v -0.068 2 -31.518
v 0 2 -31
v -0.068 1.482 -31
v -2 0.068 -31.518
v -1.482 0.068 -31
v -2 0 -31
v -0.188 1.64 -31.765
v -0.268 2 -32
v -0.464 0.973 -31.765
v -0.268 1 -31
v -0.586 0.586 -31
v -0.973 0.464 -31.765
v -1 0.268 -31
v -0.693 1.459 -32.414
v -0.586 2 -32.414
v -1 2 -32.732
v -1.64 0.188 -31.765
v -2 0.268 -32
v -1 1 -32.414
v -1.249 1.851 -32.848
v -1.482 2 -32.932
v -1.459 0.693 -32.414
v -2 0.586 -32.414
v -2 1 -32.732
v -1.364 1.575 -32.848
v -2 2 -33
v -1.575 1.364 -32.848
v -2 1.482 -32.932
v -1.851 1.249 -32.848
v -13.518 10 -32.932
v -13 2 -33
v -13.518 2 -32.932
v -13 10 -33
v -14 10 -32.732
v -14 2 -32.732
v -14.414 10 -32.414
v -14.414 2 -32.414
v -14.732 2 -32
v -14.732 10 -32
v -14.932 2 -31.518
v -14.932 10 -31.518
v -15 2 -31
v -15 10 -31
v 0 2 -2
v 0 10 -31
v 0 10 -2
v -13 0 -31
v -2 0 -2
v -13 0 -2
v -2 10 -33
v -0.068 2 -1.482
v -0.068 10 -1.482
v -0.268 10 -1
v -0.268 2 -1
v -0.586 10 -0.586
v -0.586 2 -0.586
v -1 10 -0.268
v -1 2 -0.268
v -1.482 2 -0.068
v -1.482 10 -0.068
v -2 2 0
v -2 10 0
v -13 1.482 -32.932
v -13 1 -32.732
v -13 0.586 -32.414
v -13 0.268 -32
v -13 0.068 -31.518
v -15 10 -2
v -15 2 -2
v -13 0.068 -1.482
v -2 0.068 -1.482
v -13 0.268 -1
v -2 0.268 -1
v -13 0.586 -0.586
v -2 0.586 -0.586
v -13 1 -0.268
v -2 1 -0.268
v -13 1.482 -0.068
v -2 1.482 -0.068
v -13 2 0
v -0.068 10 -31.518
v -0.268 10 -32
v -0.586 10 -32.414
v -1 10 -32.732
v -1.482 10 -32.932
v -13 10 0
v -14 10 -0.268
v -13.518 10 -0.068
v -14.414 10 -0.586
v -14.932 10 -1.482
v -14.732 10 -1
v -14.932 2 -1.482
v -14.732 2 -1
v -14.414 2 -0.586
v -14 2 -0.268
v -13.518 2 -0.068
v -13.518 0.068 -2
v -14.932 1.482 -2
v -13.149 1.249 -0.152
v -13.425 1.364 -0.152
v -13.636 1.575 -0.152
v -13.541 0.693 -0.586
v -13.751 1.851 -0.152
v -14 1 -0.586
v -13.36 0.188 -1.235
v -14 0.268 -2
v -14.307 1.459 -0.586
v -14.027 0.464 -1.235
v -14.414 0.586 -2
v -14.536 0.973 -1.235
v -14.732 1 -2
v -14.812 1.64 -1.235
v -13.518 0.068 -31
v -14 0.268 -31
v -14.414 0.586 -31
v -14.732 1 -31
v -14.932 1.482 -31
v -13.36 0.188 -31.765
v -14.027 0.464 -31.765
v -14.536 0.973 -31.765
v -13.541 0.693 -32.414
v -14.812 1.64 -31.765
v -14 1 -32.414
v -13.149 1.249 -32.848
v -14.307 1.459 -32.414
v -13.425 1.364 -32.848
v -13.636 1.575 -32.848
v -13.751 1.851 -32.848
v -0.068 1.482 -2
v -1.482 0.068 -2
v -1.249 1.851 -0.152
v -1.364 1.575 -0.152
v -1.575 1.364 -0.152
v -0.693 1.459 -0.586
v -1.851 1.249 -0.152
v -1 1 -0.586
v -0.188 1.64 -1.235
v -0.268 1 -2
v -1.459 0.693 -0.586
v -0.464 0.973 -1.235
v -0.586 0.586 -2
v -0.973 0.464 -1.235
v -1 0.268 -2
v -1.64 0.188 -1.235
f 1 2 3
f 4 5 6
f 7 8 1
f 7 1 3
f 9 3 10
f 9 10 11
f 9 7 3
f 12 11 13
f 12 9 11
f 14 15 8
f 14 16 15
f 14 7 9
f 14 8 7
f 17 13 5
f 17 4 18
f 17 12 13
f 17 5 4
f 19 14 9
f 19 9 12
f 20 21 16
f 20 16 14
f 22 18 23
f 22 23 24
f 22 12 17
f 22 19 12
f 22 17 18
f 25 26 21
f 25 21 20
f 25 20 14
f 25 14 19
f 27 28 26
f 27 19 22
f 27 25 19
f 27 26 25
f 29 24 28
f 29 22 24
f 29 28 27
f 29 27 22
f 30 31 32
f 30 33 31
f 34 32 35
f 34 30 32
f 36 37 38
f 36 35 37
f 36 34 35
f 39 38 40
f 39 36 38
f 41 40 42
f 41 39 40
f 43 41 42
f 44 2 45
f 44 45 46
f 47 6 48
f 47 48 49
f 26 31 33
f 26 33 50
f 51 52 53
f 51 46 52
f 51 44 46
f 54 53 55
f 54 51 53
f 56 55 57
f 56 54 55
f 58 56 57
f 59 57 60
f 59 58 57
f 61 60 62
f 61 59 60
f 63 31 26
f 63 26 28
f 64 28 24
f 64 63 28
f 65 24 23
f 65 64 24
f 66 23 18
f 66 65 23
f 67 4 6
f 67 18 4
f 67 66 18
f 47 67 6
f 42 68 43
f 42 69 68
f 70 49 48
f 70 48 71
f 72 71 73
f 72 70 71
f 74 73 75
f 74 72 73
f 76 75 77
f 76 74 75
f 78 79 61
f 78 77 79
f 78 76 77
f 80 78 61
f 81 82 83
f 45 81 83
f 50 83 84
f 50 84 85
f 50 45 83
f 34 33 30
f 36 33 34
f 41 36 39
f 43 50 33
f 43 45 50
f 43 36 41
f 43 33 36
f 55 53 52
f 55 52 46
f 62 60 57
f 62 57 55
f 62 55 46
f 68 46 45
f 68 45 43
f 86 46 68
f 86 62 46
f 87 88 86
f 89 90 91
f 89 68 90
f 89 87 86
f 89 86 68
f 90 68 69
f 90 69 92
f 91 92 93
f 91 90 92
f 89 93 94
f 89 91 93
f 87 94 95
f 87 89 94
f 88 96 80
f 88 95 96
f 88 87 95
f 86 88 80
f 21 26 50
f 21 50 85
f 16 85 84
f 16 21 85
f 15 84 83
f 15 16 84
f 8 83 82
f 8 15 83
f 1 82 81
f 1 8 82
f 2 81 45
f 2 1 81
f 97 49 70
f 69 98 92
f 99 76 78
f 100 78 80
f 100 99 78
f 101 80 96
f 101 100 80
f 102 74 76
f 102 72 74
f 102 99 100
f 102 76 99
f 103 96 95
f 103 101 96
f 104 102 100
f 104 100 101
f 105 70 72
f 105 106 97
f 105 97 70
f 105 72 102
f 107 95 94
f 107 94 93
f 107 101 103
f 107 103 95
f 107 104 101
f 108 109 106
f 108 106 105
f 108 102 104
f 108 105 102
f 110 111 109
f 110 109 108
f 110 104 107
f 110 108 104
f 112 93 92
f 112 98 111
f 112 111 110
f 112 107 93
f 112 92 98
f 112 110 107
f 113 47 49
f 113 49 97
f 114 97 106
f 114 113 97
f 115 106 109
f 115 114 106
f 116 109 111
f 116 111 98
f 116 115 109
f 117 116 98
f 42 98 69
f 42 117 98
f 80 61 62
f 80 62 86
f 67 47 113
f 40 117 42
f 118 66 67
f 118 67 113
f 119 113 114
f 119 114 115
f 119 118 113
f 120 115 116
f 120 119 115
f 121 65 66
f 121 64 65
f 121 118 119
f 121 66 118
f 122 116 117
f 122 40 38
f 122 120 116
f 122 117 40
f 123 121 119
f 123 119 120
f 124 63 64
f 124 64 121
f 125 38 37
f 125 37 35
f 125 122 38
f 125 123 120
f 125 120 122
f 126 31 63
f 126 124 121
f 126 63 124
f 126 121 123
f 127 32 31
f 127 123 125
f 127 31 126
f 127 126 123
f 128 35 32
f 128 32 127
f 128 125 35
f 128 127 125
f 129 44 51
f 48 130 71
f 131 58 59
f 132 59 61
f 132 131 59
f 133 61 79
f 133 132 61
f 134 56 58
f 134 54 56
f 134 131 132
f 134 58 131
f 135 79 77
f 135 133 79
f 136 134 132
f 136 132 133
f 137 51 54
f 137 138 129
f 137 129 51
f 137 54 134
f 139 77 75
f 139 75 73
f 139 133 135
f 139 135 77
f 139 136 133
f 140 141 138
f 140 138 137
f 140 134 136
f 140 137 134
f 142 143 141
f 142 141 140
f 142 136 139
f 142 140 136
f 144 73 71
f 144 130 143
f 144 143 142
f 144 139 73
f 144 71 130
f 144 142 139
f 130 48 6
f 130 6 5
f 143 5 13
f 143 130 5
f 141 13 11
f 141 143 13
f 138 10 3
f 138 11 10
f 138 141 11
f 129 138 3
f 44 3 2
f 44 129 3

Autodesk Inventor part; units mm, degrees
ref_plane "YZ Plane" through (0, 0, 0) normal (1, 0, 0) x (0, 1, 0)
ref_plane "XZ Plane" through (0, 0, 0) normal (0, 1, 0) x (-1, 0, 0)
ref_plane "XY Plane" through (0, 0, 0) normal (0, 0, 1) x (1, 0, 0)
sketch "Sketch1" plane through (0, 0, 0) normal (0, 1, 0) x (-1, 0, 0)
  line L0 (0, 0) -> (15, 0)
  line L1 (15, 0) -> (15, -33)
  line L2 (15, -33) -> (0, -33)
  line L3 (0, -33) -> (0, 0)
  dimension "d0" = 15
  dimension "d1" = 33
extrude "Extrusion1" add sketch "Sketch1" along normal blind 10
fillet "Fillet1" radius 2 2 edges at (0, 0, -16.5) (-15, 0, -16.5)
fillet "Fillet2" radius 2 10 edges at (-0.5858, 0.5858, -33) (-7.5, 0, -33) (-14.4142, 0.5858, -33) (-15, 6, -33) (0, 6, -33) (-0.5858, 0.5858, 0) (-7.5, 0, 0) (-14.4142, 0.5858, 0) (-15, 6, 0) (0, 6, 0)
sketch "Sketch2" plane through (0, 10, 0) normal (0, 1, 0) x (1, 0, 0)
  line L0 (-14.5243, 2) -> (-14.5243, 30.9154) construction
  line L1 (-14.5243, 30.9154) -> (-0.4504, 30.9154) construction
  line L2 (-0.4504, 30.9154) -> (-0.4504, 2) construction
  line L3 (-0.4504, 2) -> (-14.5243, 2) construction
properties material "ABS Plastic"
